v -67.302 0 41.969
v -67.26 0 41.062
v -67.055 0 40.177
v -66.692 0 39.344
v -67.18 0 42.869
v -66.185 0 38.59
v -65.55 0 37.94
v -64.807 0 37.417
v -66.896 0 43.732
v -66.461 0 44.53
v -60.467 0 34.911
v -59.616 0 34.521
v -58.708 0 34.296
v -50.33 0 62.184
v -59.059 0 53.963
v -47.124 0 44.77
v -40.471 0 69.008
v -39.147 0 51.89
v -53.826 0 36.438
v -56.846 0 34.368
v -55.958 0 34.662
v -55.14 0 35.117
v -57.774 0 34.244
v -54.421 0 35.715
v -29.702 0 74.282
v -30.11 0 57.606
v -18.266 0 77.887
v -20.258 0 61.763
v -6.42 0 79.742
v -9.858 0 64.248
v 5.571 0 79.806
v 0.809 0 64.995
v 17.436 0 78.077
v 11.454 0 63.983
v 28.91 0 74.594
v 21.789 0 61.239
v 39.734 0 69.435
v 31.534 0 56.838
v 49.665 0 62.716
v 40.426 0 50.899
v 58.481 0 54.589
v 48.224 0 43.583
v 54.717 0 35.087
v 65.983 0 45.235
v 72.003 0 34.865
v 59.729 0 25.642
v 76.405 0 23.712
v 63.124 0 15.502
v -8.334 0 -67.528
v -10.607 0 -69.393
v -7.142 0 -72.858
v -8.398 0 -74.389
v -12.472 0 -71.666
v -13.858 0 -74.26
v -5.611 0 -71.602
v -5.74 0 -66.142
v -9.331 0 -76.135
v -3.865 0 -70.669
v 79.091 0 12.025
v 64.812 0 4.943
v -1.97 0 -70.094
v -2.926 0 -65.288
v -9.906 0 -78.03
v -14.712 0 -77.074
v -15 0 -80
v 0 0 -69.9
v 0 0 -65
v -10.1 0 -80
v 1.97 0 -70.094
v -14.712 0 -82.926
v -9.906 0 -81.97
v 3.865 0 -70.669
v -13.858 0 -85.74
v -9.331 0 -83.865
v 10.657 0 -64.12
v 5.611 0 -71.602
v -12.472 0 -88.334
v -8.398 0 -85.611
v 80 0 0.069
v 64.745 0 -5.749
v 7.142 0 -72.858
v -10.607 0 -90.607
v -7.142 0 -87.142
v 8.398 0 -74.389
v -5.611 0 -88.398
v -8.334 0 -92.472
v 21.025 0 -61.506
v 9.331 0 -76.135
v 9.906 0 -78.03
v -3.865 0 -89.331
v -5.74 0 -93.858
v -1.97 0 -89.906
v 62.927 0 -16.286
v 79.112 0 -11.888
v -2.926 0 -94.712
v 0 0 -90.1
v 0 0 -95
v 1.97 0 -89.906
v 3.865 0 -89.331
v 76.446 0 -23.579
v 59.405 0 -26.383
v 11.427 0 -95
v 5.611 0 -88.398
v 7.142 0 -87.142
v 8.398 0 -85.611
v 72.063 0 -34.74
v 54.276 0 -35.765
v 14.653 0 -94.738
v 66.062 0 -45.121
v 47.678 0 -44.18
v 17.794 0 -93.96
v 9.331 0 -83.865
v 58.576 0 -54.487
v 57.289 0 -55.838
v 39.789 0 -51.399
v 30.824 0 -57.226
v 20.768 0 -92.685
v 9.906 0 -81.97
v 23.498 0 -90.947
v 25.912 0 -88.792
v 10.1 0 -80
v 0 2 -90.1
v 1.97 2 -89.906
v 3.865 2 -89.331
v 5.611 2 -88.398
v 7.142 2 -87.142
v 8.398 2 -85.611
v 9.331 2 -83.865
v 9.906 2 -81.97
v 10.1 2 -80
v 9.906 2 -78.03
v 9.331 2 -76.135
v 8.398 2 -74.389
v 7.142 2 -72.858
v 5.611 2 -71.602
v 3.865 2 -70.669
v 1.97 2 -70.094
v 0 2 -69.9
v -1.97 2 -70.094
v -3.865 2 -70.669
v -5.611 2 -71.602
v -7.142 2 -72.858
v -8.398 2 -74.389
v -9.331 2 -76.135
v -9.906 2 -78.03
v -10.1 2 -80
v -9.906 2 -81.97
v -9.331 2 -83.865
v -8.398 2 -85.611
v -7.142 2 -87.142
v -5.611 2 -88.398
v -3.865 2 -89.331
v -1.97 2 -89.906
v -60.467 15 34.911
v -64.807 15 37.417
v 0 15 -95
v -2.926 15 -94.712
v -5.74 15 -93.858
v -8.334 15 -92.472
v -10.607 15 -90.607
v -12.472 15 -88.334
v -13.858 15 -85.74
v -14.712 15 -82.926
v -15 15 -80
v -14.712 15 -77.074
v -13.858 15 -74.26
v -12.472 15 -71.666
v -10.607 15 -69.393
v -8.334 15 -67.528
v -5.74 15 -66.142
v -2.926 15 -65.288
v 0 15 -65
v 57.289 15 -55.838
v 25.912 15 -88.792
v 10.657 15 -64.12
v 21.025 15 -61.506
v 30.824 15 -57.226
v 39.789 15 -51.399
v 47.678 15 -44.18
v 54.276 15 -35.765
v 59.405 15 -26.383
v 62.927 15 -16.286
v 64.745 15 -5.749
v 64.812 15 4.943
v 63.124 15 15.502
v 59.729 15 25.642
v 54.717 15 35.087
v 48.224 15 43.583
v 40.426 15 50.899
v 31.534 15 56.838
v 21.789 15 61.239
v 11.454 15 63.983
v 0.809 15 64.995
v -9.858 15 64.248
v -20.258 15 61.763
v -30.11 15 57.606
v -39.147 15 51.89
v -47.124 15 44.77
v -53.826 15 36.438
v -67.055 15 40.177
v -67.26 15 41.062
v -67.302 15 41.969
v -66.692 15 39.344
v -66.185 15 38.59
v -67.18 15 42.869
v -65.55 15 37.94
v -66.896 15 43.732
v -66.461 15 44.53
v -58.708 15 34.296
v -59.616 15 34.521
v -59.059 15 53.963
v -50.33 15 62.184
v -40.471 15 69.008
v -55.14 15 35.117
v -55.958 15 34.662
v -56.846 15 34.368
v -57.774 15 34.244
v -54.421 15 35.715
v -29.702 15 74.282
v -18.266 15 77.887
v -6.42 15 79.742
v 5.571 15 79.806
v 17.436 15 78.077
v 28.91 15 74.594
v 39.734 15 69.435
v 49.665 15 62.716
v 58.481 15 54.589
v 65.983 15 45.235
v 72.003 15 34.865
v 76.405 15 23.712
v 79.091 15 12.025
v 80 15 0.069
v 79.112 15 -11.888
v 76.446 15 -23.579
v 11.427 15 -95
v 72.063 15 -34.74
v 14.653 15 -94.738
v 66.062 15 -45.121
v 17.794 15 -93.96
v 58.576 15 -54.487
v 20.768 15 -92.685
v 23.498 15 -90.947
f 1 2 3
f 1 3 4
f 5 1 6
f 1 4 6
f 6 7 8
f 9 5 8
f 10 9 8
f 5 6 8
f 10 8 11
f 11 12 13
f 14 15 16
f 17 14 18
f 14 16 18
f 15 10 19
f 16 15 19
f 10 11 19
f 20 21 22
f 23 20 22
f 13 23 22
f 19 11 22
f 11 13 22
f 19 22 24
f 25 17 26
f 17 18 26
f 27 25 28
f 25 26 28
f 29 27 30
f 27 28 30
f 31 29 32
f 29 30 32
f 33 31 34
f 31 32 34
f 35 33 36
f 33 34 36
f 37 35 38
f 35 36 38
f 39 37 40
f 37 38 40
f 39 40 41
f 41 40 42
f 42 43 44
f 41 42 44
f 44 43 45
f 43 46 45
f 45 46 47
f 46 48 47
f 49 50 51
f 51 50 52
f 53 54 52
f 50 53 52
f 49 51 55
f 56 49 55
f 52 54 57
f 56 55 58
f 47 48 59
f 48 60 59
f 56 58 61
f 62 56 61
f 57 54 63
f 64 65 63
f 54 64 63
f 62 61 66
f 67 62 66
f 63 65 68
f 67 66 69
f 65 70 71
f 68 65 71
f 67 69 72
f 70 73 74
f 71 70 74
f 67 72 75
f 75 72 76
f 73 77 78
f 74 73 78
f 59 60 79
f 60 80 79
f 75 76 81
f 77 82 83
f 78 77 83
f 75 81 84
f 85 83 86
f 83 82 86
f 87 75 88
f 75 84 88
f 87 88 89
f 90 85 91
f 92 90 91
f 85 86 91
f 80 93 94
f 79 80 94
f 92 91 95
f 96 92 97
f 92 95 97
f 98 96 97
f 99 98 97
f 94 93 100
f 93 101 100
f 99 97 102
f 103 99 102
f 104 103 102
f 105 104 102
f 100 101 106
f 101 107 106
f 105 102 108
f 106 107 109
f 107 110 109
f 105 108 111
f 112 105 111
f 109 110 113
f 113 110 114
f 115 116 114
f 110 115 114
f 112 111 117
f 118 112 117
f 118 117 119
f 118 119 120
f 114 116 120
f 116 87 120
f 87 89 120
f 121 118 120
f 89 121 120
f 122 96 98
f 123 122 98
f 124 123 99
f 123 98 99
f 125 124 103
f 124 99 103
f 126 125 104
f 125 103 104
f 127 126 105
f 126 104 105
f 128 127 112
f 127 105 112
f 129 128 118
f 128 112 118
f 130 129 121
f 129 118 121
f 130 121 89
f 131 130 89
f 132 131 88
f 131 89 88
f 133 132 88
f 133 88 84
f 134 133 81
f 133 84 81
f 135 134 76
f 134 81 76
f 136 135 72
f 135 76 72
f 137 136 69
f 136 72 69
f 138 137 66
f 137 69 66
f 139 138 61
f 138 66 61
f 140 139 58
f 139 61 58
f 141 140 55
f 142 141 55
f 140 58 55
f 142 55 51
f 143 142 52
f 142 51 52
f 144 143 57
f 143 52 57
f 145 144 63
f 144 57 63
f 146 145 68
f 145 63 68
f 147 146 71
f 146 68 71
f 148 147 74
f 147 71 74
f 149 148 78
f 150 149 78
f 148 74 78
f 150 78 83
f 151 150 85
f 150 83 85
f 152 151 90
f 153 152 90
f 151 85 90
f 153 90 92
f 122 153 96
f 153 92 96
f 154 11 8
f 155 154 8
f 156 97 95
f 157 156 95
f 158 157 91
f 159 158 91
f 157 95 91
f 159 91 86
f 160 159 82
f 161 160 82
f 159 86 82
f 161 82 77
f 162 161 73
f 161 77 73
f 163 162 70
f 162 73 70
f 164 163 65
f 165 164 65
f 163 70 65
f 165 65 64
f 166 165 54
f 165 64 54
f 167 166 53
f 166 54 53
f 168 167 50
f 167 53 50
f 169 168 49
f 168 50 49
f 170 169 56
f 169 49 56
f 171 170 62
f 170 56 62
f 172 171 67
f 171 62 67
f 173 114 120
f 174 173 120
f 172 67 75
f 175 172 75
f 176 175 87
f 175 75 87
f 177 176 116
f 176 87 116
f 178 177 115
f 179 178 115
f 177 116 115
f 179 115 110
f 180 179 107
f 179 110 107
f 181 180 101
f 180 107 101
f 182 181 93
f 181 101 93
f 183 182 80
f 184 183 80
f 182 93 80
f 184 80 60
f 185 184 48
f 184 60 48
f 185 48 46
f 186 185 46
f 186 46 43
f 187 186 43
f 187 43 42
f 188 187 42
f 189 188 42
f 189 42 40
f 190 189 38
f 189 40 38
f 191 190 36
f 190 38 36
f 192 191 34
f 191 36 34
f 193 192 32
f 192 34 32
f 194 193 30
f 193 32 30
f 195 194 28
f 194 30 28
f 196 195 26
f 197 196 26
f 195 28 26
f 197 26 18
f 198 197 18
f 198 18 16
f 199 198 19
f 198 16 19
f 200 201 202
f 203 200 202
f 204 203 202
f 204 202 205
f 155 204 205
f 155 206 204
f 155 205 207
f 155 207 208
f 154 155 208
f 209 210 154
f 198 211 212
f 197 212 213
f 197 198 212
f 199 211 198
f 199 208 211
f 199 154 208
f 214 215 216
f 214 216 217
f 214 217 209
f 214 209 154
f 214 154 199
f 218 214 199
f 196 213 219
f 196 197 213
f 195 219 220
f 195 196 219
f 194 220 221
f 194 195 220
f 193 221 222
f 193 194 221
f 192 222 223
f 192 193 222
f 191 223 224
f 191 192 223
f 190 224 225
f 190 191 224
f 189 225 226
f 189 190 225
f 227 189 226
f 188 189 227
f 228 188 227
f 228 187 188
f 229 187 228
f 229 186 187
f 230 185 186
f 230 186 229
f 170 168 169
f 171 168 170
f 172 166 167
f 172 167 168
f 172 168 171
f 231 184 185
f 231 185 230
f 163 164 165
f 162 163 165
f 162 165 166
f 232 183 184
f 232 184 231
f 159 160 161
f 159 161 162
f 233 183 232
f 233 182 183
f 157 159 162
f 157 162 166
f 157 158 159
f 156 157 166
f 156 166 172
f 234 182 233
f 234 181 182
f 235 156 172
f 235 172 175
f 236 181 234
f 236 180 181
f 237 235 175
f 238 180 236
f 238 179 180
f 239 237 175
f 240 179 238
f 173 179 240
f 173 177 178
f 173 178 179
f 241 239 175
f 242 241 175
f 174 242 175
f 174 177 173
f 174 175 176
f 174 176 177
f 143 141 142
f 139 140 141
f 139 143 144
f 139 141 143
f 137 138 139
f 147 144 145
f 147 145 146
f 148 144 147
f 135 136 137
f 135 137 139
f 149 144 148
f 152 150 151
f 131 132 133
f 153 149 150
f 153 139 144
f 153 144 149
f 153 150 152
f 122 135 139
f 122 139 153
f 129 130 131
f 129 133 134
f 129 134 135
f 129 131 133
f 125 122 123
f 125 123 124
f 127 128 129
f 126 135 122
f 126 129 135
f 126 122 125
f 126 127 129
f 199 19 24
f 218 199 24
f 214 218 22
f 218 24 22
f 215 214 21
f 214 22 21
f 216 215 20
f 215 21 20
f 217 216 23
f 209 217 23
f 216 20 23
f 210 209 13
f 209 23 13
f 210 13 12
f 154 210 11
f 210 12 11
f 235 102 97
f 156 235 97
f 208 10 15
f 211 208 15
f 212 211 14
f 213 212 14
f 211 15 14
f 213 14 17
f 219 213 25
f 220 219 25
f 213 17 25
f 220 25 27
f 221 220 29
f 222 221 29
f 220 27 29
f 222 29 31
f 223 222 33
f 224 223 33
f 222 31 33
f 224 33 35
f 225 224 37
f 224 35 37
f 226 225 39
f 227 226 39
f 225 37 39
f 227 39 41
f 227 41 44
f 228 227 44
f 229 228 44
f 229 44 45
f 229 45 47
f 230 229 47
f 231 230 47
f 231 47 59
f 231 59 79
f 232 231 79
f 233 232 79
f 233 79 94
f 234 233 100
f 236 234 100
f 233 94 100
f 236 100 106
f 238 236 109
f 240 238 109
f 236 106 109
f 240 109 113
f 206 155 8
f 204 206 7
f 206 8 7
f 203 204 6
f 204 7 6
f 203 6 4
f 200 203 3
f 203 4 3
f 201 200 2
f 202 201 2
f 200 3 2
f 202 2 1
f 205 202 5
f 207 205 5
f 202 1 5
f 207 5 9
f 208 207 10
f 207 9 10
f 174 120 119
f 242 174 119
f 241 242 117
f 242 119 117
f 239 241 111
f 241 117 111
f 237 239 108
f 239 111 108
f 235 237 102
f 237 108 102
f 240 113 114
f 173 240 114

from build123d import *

# Parameters (mm, degrees)
EXTRUDE_4_DEPTH     = 15
SKETCH_3_R          = 10.1
CUT_EXTRUDE_1_DEPTH = 2


with BuildPart() as part:
    # ｽｹｯﾁ2 → ﾎﾞｽ - 押し出し4 (new body)
    with BuildSketch(Plane(origin=(0, 0, 0), x_dir=(1, 0, 0), z_dir=(0, 1, 0))):
        with BuildLine():
            ThreePointArc((-53.82643789, -36.437818048), (-56.846261527, -34.367935813), (-60.466933112, -34.910600109))
            Line((-60.466933112, -34.910600109), (-64.807406984, -37.416573868))
            ThreePointArc((-64.807406984, -37.416573868), (-67.177509772, -40.614402853), (-66.461234116, -44.529814279))
            ThreePointArc((-66.461234116, -44.529814279), (49.665387485, -62.716419588), (58.57572973, 54.487465409))
            Line((58.57572973, 54.487465409), (57.289371136, 55.838409315))
            Line((57.289371136, 55.838409315), (25.911523347, 88.791671712))
            ThreePointArc((25.911523347, 88.791671712), (19.306695871, 93.382511176), (11.427401304, 95))
            Line((11.427401304, 95), (0, 95))
            ThreePointArc((0, 95), (-15, 80), (0, 65))
            ThreePointArc((0, 65), (57.41714976, -30.467538684), (-53.82643789, -36.437818048))
        make_face()
    extrude(amount=EXTRUDE_4_DEPTH)

    # ｽｹｯﾁ3 → ｶｯﾄ - 押し出し1 (cut)
    with BuildSketch(Plane.XZ):
        with Locations(Location((0, -80, 0), (0, 0, 270))):
            Circle(SKETCH_3_R)
    extrude(amount=-CUT_EXTRUDE_1_DEPTH, mode=Mode.SUBTRACT)


solid = part.part
